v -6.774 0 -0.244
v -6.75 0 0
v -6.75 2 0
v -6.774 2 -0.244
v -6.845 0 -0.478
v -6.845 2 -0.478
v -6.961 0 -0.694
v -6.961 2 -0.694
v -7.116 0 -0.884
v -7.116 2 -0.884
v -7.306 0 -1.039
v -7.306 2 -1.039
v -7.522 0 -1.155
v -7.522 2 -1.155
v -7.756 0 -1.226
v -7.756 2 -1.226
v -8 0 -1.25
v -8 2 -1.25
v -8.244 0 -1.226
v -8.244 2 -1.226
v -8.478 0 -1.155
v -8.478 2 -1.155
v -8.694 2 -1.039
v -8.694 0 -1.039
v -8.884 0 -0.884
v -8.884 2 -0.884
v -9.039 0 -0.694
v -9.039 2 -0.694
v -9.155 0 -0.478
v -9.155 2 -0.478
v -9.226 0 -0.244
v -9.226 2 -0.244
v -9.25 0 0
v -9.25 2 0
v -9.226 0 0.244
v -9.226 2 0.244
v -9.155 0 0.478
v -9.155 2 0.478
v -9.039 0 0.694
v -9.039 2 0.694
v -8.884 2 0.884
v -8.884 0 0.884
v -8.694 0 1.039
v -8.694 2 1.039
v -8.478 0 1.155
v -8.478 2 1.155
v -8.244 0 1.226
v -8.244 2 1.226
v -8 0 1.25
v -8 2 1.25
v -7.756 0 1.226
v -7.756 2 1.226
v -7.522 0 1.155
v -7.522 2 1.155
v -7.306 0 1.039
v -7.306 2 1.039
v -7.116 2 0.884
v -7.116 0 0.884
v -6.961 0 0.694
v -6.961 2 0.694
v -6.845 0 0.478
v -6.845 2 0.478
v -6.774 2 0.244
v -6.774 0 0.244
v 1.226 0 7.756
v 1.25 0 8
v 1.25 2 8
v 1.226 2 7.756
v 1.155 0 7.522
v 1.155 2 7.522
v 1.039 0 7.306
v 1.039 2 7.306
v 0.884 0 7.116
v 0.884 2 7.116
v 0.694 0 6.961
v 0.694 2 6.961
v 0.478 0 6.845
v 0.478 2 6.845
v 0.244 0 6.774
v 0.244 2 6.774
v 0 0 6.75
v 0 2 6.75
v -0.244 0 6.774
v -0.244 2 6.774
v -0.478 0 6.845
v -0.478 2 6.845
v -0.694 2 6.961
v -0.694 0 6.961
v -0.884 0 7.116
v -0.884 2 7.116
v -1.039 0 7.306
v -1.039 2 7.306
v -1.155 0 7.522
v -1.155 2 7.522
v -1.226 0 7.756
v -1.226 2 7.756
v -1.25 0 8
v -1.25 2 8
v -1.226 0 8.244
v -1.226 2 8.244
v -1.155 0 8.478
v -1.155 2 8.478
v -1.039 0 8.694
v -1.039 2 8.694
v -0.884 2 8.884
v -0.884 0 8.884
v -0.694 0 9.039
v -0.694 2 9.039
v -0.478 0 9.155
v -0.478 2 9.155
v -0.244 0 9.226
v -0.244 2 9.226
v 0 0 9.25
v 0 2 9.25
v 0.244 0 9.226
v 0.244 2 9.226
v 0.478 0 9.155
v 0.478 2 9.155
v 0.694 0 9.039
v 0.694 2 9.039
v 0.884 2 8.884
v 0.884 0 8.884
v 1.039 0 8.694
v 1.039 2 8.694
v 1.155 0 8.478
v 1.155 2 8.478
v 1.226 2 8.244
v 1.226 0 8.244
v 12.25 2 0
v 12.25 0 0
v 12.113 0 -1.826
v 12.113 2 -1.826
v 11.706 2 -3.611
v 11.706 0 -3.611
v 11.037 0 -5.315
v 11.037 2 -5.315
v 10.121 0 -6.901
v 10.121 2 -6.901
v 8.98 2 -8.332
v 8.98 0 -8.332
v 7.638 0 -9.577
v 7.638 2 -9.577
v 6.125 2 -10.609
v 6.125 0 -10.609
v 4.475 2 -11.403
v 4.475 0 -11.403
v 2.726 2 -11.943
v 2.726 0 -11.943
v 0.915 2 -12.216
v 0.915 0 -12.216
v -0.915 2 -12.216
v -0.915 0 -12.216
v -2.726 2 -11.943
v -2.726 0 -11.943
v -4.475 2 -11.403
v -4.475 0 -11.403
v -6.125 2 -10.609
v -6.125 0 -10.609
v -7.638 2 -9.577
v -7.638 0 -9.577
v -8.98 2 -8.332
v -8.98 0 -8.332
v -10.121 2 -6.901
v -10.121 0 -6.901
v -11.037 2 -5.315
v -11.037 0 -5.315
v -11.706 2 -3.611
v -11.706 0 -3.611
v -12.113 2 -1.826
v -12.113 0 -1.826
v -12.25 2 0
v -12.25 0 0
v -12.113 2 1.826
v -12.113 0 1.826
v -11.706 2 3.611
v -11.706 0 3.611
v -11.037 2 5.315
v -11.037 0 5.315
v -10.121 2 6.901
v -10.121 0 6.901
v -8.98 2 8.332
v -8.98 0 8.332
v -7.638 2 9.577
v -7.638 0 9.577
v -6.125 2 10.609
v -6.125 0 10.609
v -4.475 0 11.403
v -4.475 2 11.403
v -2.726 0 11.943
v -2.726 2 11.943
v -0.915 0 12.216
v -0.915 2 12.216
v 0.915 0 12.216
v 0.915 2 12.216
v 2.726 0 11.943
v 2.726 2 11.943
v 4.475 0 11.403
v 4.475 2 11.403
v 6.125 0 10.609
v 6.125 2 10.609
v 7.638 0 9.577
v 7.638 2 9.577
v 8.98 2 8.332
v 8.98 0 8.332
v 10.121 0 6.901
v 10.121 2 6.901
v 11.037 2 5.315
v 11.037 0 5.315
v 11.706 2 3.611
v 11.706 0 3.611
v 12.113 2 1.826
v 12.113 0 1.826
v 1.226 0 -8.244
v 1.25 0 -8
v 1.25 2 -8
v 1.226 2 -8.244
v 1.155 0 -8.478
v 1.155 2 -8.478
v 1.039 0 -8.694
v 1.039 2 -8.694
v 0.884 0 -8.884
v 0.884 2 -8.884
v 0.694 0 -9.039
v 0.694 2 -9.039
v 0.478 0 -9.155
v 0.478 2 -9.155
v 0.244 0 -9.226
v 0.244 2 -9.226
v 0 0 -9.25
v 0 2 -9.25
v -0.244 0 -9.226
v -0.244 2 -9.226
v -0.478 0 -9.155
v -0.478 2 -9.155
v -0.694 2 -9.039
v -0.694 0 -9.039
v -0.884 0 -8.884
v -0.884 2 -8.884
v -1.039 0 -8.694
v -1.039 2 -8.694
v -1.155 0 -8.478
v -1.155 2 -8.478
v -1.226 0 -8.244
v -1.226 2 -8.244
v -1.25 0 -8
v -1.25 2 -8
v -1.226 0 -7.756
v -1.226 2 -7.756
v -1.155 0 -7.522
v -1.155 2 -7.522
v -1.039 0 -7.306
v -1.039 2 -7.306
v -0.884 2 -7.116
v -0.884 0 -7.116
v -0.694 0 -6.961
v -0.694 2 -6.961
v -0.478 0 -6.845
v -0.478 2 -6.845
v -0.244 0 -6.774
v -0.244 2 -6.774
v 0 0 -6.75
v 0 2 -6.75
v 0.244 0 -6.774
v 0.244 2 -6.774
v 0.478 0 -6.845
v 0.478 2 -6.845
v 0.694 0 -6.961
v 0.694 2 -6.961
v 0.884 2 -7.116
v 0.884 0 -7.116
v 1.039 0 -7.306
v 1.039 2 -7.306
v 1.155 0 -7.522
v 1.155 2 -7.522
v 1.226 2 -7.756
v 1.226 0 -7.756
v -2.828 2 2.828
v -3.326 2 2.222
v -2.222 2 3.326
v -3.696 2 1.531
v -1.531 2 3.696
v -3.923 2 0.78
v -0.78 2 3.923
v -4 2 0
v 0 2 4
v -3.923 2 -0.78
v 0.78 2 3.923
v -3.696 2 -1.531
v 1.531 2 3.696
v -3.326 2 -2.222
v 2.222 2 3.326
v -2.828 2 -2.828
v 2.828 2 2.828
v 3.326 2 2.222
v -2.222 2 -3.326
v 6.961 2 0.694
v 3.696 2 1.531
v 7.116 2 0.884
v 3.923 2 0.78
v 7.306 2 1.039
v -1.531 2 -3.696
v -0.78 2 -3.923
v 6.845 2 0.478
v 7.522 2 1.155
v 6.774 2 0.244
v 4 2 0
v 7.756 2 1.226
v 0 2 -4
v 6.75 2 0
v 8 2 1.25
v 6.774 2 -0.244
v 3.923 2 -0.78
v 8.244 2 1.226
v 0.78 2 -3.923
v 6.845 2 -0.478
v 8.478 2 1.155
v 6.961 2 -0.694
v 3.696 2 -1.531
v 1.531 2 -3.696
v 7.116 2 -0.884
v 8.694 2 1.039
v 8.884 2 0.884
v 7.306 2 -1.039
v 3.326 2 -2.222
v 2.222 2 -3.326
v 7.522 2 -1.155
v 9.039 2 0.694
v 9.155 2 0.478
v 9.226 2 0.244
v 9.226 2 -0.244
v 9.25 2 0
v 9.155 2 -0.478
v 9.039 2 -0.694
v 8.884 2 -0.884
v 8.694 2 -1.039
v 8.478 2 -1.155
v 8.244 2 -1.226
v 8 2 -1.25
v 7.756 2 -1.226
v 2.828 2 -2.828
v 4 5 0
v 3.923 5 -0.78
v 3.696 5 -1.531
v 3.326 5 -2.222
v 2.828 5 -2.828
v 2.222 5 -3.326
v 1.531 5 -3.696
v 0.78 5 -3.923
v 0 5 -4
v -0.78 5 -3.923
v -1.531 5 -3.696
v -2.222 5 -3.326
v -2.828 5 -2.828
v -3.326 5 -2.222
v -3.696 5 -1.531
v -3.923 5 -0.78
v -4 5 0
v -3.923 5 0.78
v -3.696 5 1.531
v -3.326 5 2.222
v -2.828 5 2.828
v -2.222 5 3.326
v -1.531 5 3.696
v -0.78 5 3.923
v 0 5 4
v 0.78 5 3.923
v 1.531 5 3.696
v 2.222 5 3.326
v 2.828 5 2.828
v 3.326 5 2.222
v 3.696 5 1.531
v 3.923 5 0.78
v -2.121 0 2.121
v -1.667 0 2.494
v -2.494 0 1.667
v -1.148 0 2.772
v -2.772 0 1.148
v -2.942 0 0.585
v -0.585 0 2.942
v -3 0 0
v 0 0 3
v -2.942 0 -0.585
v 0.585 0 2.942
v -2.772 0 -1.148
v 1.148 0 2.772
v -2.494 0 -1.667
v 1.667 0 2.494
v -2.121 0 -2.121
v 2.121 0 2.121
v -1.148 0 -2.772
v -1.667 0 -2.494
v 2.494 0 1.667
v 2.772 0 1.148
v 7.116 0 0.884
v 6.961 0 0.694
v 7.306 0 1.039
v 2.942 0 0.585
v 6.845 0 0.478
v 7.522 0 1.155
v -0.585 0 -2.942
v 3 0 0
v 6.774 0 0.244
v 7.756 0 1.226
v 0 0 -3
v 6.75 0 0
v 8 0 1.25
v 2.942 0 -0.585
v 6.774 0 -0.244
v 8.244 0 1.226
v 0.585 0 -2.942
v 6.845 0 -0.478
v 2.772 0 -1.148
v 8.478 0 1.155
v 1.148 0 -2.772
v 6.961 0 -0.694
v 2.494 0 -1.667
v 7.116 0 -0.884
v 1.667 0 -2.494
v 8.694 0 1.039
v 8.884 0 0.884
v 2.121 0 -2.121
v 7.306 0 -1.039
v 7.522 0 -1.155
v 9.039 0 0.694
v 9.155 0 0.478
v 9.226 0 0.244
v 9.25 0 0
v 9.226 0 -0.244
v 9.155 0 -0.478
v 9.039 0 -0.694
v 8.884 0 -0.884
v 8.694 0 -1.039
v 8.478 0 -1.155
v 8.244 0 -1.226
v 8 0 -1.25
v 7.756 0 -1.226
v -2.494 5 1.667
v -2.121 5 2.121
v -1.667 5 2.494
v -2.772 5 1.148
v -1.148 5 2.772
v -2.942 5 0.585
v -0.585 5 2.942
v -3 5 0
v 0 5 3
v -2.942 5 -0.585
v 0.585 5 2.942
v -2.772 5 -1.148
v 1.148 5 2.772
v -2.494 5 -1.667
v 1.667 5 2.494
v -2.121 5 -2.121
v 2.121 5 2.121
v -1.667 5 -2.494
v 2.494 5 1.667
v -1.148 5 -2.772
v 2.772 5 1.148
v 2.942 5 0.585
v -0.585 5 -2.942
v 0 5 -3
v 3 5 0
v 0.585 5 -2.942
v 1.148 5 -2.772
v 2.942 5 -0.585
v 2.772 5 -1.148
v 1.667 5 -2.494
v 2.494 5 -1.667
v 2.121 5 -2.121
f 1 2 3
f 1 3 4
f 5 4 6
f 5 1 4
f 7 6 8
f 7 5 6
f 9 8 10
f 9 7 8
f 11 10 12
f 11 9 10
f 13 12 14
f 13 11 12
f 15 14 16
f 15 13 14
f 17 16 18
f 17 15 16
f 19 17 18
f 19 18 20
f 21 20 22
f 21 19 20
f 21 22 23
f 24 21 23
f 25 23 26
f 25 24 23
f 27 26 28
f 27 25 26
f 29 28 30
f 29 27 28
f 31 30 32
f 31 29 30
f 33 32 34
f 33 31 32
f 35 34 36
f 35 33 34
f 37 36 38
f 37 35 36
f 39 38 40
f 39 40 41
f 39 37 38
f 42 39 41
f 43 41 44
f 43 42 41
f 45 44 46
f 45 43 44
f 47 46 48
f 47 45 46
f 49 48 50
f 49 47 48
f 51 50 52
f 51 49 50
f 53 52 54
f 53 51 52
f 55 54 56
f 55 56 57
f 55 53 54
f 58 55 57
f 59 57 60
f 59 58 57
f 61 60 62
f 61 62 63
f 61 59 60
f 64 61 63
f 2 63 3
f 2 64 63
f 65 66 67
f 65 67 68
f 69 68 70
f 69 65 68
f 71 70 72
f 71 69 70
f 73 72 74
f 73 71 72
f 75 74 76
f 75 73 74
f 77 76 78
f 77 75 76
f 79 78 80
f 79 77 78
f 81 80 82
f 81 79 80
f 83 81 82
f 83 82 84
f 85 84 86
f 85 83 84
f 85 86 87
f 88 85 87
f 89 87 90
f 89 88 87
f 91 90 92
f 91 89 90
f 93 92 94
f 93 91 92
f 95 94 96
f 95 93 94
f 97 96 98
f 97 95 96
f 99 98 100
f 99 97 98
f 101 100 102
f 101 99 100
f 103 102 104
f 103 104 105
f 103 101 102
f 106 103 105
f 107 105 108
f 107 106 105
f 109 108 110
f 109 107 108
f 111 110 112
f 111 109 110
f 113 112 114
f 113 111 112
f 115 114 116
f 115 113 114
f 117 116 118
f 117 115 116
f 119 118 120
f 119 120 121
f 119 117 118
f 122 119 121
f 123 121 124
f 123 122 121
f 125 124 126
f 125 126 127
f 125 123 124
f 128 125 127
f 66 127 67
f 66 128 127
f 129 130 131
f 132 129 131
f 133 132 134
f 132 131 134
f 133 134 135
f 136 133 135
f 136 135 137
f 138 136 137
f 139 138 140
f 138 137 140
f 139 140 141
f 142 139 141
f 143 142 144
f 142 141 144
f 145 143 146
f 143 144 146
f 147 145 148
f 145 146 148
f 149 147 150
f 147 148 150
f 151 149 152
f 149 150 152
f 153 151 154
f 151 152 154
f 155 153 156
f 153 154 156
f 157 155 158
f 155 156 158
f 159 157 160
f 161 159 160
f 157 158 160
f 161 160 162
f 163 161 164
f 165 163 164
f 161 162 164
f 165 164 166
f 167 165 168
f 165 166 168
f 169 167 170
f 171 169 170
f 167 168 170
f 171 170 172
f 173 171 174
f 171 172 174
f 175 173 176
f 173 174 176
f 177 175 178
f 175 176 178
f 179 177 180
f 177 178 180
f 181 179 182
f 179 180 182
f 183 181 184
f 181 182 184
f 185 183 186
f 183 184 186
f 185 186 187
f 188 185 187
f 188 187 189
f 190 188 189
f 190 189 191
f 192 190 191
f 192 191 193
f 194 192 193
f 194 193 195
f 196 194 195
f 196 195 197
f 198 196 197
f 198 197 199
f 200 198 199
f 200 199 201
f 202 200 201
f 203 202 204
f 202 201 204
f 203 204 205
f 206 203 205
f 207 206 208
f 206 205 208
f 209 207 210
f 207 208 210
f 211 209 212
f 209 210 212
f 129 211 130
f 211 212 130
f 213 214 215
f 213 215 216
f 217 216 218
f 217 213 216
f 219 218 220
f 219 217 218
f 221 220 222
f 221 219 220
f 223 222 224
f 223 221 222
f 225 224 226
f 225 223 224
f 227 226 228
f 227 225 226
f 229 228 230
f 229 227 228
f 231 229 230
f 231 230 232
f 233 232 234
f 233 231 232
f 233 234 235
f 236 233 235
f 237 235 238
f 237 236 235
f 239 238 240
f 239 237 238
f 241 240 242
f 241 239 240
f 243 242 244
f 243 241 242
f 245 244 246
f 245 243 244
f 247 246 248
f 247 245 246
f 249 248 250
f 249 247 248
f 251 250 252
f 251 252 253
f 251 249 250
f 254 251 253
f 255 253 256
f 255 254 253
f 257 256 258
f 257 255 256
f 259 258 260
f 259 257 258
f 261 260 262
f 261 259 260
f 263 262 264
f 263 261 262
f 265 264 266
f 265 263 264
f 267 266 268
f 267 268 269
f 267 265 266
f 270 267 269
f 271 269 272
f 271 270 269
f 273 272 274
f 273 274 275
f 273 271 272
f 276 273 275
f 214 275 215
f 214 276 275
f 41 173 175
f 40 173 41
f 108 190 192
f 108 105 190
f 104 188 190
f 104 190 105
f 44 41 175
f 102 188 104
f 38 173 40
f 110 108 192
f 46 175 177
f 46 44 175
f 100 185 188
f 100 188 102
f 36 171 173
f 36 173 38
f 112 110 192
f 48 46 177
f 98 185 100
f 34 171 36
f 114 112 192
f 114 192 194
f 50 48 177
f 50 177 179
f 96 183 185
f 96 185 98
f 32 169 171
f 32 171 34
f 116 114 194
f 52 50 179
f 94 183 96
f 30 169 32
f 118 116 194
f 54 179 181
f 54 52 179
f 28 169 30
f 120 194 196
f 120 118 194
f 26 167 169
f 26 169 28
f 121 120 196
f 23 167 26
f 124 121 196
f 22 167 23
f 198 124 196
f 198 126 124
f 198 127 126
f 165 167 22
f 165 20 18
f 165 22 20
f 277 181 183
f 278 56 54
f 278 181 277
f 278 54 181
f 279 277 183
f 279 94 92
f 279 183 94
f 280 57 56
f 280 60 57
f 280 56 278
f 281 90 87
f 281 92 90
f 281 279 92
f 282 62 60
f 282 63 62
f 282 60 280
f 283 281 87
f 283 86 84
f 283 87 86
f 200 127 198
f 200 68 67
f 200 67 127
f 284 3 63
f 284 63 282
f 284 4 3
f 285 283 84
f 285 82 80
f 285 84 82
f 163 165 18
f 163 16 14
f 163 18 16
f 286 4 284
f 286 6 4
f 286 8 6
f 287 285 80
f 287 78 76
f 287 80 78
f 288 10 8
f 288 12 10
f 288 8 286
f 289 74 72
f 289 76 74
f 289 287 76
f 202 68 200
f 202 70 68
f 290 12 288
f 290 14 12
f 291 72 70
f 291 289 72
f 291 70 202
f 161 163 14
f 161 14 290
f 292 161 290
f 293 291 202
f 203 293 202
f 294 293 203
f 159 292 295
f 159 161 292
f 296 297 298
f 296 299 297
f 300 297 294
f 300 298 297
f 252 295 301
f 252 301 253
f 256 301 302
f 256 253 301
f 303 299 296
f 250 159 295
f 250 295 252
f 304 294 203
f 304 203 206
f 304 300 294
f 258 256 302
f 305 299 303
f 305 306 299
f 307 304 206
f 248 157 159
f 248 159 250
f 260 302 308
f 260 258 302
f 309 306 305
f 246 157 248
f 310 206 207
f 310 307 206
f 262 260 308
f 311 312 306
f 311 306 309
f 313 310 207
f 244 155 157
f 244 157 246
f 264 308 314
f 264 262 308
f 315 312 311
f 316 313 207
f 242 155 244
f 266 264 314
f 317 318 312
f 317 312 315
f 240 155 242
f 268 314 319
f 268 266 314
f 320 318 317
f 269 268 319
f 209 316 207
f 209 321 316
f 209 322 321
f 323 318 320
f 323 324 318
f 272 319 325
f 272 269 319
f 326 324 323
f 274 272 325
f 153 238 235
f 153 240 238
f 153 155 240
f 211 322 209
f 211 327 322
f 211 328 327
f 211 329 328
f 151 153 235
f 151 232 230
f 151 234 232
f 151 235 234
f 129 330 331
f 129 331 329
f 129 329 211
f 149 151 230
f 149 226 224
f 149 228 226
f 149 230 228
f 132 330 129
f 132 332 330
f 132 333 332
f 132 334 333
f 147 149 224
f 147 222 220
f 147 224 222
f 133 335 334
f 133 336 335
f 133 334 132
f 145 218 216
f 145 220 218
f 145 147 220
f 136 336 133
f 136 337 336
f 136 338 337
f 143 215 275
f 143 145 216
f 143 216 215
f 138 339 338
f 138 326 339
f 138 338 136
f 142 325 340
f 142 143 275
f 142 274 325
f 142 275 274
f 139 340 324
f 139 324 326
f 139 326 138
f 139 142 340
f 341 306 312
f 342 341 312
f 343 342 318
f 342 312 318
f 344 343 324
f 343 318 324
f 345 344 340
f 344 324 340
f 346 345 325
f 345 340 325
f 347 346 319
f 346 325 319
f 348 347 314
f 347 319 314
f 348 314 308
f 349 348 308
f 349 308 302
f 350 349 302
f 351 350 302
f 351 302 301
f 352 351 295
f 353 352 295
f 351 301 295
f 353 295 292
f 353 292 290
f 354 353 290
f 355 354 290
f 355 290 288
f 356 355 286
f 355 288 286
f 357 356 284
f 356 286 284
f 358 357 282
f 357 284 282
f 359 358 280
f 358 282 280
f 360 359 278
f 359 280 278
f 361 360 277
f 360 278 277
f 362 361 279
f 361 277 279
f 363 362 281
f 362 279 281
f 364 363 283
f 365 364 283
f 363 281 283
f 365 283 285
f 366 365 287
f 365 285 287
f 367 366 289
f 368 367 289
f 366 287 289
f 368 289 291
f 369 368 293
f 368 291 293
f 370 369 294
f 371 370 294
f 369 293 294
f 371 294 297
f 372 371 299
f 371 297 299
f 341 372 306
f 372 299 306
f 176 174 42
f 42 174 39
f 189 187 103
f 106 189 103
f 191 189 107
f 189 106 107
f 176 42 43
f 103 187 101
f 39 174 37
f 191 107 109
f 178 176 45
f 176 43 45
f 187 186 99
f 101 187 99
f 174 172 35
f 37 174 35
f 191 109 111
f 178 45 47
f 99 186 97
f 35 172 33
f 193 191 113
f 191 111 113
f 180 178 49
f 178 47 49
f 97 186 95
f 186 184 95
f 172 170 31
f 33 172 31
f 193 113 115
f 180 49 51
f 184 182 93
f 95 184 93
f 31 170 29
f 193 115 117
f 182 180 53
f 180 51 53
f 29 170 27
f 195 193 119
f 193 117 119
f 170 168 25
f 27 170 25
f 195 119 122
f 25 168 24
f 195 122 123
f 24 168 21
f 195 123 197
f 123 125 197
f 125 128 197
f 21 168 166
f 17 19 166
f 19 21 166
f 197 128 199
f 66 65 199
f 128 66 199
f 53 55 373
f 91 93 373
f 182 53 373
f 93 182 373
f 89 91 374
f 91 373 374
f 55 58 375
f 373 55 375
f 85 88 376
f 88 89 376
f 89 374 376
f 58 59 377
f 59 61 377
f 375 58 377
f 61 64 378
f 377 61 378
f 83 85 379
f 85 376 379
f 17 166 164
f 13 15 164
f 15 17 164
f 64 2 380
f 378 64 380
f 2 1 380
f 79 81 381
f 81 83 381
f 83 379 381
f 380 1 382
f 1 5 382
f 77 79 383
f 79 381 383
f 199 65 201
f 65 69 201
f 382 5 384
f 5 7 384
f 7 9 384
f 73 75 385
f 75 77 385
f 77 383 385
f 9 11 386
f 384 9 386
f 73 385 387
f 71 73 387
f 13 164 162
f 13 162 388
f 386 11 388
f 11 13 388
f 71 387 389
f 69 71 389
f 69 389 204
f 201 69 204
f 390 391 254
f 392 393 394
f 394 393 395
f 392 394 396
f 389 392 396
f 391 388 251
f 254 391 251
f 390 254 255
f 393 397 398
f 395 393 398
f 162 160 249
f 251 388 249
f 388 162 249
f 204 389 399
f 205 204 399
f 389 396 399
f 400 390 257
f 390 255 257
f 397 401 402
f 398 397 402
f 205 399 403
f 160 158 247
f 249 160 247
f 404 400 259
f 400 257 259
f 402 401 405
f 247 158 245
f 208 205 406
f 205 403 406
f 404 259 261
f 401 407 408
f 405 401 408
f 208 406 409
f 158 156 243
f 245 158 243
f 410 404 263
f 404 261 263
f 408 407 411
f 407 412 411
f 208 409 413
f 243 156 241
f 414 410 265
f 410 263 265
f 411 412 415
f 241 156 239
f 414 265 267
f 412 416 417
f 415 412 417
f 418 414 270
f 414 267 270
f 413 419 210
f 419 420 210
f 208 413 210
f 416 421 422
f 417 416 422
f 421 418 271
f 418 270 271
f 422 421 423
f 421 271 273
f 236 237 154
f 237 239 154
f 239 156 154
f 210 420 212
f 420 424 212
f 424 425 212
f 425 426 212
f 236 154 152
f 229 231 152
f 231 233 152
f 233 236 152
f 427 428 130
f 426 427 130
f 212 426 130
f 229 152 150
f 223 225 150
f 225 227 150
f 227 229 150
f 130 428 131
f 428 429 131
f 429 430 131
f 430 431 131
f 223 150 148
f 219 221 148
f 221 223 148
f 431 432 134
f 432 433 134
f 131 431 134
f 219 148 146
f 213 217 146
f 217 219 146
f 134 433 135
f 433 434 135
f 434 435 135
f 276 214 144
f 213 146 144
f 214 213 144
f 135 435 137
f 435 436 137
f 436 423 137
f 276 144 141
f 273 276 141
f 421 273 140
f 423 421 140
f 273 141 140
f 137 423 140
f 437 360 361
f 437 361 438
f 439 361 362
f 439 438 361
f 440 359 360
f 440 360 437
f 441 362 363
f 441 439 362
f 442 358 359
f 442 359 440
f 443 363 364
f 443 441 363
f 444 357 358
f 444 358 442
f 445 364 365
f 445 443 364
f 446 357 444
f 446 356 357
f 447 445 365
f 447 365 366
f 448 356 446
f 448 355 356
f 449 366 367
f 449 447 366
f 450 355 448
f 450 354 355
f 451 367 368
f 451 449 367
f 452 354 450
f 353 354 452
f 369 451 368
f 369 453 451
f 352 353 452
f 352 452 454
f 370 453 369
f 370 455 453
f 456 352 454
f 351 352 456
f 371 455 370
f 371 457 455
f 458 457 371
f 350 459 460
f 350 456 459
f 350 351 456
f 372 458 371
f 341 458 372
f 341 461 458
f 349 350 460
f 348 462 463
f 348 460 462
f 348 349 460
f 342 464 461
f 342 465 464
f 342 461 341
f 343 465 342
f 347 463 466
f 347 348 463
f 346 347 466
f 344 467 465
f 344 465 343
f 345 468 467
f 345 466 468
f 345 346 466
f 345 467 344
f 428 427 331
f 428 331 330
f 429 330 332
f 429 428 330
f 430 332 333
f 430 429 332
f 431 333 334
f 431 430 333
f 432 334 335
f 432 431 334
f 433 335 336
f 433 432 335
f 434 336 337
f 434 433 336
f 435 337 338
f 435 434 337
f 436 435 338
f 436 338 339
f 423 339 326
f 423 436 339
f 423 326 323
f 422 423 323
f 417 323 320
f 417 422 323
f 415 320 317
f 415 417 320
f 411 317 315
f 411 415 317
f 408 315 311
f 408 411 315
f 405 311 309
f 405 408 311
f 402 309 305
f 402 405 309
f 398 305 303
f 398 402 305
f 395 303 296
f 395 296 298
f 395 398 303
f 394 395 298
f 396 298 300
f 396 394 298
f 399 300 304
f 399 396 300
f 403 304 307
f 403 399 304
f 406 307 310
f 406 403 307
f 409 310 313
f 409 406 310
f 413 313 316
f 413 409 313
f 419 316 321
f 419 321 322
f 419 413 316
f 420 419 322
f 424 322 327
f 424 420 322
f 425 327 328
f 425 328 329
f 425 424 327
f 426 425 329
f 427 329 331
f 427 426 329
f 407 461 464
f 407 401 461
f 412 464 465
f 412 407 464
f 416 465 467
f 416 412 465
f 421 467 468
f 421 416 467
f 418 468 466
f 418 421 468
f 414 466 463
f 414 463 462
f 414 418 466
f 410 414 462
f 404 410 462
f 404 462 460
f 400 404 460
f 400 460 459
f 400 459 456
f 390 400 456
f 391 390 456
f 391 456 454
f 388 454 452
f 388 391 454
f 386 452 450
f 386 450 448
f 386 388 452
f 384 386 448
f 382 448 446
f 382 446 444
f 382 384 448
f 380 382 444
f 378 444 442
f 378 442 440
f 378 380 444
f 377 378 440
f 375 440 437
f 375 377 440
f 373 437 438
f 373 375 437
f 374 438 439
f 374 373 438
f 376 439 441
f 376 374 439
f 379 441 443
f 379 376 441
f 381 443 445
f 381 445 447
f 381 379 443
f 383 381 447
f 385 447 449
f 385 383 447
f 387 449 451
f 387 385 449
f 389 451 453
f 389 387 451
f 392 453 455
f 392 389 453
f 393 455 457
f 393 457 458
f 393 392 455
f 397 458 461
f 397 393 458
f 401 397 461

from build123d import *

# Parameters (mm, degrees)
SKETCH_1_R      = 12.25
SKETCH_1_R_2    = 3
SKETCH_1_R_3    = 1.25
EXTRUDE_1_DEPTH = 2
SKETCH_2_R      = 4
SKETCH_2_R_2    = 3
EXTRUDE_2_DEPTH = 3


with BuildPart() as part:
    # 草图1 → 凸台-拉伸1 (new body)
    with BuildSketch(Plane(origin=(0, 0, 0), x_dir=(1, 0, 0), z_dir=(0, 1, 0))):
        Circle(SKETCH_1_R)
        Circle(SKETCH_1_R_2, mode=Mode.SUBTRACT)
        with Locations((8, 0)):
            Circle(SKETCH_1_R_3, mode=Mode.SUBTRACT)
        with Locations((0, -8)):
            Circle(SKETCH_1_R_3, mode=Mode.SUBTRACT)
        with Locations((-8, 0)):
            Circle(SKETCH_1_R_3, mode=Mode.SUBTRACT)
        with Locations((0, 8)):
            Circle(SKETCH_1_R_3, mode=Mode.SUBTRACT)
    extrude(amount=EXTRUDE_1_DEPTH)

    # 草图2 → 凸台-拉伸2 (add)
    with BuildSketch(Plane(origin=(0, 2, 0), x_dir=(1, 0, 0), z_dir=(0, 1, 0))):
        Circle(SKETCH_2_R)
        Circle(SKETCH_2_R_2, mode=Mode.SUBTRACT)
    extrude(amount=EXTRUDE_2_DEPTH)


solid = part.part
